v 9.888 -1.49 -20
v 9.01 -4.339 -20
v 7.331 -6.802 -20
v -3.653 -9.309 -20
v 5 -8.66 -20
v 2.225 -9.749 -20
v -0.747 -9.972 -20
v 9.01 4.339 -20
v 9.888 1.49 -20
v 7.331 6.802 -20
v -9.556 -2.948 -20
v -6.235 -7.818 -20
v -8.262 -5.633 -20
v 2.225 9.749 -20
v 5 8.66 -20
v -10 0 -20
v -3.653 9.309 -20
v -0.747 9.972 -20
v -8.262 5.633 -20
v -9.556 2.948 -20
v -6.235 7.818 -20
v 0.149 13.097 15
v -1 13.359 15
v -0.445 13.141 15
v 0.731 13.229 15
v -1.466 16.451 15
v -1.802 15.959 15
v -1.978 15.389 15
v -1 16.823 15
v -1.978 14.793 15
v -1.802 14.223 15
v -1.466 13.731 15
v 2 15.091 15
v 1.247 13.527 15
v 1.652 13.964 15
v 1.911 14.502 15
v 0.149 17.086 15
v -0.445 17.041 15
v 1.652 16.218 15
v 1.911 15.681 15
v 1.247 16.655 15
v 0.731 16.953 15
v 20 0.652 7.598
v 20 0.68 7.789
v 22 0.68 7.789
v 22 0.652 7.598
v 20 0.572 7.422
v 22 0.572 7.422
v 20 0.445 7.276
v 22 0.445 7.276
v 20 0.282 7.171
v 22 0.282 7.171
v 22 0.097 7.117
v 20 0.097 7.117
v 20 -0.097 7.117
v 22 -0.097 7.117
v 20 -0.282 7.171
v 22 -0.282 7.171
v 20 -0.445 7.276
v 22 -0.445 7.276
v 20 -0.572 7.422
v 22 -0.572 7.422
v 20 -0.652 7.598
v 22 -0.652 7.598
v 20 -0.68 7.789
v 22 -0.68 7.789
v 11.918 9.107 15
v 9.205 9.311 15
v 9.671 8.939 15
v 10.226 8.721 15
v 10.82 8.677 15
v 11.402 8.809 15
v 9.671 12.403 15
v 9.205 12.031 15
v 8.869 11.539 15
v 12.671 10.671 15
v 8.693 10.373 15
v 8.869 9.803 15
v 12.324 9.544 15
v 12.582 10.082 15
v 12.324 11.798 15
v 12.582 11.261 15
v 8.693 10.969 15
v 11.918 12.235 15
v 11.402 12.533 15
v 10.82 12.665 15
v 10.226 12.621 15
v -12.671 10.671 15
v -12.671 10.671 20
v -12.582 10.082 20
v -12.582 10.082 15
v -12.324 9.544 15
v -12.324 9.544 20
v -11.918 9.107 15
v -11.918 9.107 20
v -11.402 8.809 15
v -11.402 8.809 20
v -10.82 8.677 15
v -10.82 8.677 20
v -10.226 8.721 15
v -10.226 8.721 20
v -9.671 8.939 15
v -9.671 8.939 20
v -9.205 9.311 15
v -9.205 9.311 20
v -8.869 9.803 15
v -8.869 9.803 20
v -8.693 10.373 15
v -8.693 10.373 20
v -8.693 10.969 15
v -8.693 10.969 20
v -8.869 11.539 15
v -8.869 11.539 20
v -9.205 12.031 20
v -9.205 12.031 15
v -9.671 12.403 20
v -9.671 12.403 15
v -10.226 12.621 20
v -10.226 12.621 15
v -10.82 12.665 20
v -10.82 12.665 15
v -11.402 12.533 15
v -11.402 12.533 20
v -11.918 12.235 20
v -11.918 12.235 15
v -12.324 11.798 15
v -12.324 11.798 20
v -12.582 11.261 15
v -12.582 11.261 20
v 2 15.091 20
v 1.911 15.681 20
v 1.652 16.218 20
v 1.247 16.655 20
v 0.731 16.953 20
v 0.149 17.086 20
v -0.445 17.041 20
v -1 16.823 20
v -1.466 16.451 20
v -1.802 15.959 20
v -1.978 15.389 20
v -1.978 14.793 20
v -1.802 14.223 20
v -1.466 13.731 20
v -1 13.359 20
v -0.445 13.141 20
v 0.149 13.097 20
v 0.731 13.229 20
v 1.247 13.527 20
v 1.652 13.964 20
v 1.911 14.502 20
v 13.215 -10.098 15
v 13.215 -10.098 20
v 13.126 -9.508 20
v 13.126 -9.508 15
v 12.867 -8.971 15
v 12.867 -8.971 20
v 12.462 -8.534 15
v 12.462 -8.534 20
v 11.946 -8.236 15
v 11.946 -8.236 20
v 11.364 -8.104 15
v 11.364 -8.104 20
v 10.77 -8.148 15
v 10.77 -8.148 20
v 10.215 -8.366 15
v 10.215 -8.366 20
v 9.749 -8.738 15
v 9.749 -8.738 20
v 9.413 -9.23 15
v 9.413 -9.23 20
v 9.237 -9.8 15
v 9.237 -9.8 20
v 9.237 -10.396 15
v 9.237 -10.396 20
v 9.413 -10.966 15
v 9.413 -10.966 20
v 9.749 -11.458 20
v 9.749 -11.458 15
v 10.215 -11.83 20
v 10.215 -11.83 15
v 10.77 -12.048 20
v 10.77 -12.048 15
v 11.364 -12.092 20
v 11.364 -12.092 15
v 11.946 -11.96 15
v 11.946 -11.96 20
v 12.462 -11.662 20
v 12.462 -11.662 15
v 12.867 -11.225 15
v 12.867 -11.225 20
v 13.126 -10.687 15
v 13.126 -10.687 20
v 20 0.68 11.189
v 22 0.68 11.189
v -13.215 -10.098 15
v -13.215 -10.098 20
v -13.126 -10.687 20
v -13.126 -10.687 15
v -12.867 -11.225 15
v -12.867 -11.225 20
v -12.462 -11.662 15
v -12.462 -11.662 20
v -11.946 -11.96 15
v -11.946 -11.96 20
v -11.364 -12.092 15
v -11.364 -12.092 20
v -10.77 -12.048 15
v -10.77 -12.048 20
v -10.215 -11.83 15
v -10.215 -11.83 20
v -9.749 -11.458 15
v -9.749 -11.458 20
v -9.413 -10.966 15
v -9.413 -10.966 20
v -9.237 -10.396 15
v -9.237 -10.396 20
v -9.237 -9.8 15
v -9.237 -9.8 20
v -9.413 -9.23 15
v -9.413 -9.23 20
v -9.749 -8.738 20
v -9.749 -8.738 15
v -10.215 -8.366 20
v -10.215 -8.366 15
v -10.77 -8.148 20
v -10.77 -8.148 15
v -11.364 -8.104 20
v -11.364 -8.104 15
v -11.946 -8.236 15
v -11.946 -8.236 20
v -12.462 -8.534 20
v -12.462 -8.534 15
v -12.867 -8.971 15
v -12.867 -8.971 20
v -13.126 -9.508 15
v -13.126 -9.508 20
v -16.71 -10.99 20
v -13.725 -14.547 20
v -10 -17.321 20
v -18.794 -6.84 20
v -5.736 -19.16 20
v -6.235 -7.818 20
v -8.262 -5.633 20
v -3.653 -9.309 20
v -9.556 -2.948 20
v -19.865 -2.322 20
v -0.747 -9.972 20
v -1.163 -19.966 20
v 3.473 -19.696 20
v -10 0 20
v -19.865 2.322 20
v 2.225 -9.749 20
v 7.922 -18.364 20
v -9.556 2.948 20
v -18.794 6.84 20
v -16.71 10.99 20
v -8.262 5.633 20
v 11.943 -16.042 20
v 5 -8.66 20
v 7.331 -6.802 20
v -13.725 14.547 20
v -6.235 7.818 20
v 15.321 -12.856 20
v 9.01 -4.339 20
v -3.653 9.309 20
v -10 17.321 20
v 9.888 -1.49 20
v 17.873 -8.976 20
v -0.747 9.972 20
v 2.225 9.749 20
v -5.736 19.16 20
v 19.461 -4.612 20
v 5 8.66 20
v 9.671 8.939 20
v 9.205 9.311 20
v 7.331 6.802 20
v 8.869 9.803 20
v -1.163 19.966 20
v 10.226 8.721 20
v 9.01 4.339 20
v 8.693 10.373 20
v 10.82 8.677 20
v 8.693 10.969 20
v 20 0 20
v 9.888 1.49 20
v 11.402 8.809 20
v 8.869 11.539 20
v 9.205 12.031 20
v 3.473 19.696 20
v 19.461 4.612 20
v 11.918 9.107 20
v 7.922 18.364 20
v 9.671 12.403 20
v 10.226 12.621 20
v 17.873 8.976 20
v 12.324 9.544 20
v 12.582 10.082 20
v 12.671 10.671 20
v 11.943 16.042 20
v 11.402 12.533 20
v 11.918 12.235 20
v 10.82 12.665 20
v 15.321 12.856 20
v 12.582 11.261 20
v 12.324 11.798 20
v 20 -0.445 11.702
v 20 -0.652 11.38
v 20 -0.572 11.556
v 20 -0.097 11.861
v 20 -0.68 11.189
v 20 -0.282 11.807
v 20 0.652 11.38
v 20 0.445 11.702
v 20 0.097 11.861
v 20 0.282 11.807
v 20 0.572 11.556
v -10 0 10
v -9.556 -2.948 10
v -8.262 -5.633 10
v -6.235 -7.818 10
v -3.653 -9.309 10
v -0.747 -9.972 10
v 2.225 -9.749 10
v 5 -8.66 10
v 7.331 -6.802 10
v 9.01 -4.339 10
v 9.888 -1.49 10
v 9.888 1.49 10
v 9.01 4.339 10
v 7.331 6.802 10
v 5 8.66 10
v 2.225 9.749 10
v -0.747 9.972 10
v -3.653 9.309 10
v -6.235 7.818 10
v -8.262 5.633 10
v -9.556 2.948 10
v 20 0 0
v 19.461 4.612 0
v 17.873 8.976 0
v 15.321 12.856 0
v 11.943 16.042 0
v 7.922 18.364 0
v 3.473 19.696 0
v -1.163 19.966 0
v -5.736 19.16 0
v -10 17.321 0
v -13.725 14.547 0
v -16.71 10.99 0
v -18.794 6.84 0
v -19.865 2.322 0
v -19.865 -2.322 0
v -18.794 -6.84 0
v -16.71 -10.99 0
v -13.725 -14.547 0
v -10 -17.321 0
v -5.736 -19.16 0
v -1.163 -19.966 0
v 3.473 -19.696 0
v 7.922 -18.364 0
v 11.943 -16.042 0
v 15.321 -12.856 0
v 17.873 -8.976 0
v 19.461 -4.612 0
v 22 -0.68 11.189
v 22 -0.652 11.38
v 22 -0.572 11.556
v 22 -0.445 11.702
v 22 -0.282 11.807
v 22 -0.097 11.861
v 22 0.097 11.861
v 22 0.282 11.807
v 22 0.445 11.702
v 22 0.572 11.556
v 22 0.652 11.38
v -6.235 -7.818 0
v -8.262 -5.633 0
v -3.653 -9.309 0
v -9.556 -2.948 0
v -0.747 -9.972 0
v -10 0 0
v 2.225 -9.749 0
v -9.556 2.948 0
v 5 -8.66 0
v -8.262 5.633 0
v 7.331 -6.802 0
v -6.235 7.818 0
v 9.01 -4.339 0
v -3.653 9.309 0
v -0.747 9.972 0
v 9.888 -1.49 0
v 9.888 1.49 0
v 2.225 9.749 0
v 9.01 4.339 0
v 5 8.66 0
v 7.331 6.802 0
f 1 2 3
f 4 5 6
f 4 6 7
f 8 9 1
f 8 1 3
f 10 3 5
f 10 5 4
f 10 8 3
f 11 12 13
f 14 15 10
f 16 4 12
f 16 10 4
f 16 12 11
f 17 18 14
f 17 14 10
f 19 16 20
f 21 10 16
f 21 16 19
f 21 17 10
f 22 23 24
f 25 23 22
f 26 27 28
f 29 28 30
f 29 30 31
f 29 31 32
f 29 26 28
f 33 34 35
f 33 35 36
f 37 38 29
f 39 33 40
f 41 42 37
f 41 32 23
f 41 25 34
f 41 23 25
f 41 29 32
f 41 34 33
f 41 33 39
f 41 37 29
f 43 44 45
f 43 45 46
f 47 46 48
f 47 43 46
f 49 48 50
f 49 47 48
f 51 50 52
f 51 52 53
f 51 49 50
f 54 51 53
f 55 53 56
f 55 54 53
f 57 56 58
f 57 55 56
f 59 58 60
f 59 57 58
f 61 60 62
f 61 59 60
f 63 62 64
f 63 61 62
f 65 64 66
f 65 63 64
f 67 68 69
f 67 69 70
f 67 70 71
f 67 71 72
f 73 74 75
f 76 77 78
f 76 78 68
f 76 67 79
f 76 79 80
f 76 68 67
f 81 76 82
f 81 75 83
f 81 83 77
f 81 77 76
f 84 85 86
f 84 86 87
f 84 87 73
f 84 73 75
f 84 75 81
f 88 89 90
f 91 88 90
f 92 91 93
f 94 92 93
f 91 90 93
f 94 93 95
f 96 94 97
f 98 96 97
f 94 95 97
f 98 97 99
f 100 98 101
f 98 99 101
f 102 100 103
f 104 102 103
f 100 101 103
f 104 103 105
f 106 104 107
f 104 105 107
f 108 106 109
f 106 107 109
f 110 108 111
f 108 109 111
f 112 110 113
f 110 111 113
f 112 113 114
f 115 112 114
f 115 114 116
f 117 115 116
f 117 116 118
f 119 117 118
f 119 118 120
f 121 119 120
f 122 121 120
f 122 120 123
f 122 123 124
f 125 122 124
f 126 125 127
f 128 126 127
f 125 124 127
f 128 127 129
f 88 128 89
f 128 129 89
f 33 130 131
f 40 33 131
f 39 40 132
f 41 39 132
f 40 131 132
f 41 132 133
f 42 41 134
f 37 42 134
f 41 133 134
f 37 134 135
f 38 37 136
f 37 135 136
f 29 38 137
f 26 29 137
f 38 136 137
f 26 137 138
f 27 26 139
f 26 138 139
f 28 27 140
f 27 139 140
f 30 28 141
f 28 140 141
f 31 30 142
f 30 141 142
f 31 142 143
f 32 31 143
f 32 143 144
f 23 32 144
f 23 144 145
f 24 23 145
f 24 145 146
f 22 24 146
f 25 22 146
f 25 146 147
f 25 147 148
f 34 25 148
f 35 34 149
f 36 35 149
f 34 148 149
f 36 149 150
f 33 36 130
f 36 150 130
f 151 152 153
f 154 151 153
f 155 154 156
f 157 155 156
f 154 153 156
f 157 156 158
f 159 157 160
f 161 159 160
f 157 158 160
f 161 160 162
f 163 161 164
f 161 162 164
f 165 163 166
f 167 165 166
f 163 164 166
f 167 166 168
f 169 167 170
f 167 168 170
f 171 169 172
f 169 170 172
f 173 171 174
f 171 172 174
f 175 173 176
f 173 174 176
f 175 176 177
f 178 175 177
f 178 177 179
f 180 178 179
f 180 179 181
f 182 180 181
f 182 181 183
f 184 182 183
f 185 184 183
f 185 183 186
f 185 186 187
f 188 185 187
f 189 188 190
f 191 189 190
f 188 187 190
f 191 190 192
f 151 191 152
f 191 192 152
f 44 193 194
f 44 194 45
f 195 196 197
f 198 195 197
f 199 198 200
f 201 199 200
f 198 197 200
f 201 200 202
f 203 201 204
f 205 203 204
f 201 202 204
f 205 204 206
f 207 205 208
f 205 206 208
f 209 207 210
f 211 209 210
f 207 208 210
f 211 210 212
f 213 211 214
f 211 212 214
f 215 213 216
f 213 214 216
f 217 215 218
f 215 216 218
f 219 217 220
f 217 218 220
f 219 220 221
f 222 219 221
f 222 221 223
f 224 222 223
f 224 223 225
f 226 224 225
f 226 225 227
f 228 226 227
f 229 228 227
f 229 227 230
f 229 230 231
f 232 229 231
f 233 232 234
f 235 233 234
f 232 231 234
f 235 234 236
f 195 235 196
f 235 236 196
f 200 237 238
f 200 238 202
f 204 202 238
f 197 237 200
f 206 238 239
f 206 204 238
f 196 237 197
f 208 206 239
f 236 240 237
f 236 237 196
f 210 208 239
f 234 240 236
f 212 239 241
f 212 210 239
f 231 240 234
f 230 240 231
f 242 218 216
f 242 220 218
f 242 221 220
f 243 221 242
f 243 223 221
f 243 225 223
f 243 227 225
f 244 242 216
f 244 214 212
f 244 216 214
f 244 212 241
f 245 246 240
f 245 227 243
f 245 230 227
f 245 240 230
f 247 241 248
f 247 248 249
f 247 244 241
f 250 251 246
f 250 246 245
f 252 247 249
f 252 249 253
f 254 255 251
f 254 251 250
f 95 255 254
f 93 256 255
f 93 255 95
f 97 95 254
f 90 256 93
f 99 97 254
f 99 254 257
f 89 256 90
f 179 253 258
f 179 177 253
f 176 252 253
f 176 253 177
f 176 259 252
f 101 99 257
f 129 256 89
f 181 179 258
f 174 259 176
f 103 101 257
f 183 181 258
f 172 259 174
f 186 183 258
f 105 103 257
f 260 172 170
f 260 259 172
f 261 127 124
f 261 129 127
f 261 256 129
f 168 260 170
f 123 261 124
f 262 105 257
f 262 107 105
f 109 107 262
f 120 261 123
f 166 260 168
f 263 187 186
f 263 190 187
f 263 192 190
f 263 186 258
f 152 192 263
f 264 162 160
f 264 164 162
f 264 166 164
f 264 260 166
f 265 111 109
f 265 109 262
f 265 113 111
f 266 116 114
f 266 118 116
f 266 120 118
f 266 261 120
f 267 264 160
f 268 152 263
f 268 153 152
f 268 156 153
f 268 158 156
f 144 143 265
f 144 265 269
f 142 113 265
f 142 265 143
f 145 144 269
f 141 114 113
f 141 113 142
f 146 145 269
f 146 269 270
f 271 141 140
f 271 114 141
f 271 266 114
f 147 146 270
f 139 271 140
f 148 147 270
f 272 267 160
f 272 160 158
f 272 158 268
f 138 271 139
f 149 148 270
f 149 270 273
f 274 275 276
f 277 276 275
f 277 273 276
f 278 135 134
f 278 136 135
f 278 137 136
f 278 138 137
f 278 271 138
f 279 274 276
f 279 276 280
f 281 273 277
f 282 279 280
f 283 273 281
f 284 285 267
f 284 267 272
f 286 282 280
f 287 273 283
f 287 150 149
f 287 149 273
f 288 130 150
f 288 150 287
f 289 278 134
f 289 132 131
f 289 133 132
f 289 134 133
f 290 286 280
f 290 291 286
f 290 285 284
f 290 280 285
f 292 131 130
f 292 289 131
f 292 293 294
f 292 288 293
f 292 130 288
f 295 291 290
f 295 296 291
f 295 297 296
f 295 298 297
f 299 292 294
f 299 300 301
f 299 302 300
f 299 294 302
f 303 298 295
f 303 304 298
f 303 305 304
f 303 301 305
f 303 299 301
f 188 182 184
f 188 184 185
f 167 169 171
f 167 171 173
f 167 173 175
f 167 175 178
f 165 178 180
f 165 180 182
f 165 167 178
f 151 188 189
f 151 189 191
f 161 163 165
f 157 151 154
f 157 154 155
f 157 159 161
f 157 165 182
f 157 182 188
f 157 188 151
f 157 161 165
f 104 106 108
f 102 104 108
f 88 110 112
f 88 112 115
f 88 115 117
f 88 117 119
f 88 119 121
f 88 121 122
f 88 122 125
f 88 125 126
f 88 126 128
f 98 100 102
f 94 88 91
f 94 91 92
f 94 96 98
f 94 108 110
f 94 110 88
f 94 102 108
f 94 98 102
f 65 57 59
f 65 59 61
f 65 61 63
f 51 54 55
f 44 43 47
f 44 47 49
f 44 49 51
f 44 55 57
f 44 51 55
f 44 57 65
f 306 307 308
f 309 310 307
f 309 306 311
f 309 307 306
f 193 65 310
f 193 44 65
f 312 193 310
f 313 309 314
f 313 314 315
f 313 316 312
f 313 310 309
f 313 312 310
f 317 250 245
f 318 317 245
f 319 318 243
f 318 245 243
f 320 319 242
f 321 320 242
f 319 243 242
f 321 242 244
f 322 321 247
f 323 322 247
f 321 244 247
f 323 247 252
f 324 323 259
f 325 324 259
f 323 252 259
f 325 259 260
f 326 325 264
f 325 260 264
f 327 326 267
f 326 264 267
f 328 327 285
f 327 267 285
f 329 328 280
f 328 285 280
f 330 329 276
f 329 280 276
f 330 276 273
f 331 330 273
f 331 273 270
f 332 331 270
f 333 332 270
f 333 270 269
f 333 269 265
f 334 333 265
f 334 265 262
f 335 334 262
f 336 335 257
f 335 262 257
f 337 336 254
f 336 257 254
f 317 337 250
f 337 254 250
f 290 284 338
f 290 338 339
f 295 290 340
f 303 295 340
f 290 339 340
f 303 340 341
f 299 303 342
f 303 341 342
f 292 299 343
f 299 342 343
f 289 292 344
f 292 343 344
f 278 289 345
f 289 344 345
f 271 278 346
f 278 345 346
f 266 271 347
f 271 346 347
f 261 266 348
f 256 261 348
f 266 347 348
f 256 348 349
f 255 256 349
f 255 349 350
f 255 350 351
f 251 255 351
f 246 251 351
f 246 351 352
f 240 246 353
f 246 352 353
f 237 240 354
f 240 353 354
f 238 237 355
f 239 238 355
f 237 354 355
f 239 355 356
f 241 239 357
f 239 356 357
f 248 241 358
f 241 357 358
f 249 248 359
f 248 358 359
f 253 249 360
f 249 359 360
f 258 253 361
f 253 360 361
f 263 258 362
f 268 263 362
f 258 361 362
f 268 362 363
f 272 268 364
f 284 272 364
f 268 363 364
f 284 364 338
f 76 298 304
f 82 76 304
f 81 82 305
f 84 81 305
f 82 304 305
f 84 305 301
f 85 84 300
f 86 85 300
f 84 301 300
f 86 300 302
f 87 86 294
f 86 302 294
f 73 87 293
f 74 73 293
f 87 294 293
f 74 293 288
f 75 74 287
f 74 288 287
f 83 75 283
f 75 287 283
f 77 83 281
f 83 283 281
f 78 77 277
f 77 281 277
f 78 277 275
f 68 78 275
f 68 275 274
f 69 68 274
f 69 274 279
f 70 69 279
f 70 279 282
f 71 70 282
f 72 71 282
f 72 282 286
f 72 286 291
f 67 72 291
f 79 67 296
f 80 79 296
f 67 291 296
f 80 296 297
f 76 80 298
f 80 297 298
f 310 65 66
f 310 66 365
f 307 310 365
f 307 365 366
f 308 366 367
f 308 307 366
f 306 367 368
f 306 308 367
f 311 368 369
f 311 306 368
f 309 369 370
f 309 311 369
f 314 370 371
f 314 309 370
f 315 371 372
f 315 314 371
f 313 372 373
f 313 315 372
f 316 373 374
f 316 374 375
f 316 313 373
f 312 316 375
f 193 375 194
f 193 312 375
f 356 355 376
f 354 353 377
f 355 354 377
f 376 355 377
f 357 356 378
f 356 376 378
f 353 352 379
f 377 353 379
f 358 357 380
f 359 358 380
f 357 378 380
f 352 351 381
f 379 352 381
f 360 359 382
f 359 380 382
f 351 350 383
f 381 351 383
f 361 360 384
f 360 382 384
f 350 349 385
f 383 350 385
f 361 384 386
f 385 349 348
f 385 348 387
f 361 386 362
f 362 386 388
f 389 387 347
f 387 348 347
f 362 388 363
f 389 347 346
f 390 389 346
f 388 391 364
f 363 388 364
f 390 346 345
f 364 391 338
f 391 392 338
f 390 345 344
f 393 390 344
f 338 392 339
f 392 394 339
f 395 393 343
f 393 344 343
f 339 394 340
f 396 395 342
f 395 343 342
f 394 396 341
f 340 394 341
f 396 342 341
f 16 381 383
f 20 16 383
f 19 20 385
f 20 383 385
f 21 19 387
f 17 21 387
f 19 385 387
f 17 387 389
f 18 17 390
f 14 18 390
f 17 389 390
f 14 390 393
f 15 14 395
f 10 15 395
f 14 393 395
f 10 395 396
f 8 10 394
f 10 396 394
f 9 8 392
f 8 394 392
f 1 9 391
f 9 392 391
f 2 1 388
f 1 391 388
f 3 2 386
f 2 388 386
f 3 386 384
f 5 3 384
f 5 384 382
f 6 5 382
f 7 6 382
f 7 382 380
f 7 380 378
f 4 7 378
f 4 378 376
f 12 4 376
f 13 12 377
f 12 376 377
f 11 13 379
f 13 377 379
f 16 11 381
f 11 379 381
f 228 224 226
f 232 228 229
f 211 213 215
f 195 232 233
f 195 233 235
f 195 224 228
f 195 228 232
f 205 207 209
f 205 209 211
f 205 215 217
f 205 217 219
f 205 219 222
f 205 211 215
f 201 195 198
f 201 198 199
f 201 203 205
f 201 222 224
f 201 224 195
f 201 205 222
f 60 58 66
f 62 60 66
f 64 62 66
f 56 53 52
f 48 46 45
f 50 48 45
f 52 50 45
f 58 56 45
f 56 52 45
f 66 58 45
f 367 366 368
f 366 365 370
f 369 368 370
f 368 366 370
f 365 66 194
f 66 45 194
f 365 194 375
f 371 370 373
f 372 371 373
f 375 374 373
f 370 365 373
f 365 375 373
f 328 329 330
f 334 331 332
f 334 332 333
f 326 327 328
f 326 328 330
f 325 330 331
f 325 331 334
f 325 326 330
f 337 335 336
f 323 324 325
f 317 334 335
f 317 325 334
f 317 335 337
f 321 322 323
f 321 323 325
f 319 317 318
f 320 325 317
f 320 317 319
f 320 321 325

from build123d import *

# Parameters (mm, degrees)
SKETCH1_R           = 20
BOSS_EXTRUDE1_DEPTH = 20
SKETCH2_R           = 10
BOSS_EXTRUDE2_DEPTH = 20
SKETCH3_R           = 10
CUT_EXTRUDE1_DEPTH  = 10
SKETCH9_R           = 2
CUT_EXTRUDE2_DEPTH  = 5
BOSS_EXTRUDE3_DEPTH = 2


with BuildPart() as part:
    # Sketch1 → Boss-Extrude1 (new body)
    with BuildSketch(Plane.XY):
        Circle(SKETCH1_R)
    extrude(amount=BOSS_EXTRUDE1_DEPTH)

    # Sketch2 → Boss-Extrude2 (add)
    with BuildSketch(Plane(origin=(0, 0, 0), x_dir=(-1, 0, 0), z_dir=(0, 0, -1))):
        Circle(SKETCH2_R)
    extrude(amount=BOSS_EXTRUDE2_DEPTH)

    # Sketch3 → Cut-Extrude1 (cut)
    with BuildSketch(Plane.XY.offset(20)):
        with Locations(Location((0, 0, 0), (0, 0, 180))):
            Circle(SKETCH3_R)
    extrude(amount=-CUT_EXTRUDE1_DEPTH, mode=Mode.SUBTRACT)

    # Sketch9 → Cut-Extrude2 (cut)
    with BuildSketch(Plane.XY.offset(20)):
        with Locations((0, 15.091110353)):
            Circle(SKETCH9_R)
        with Locations((10.671026466, 10.671026466)):
            Circle(SKETCH9_R)
        with Locations((11.214880569, -10.097923821)):
            Circle(SKETCH9_R)
        with Locations(Location((-11.214880569, -10.097923821, 0), (0, 0, 180))):
            Circle(SKETCH9_R)
        with Locations(Location((-10.671026466, 10.671026466, 0), (0, 0, 180))):
            Circle(SKETCH9_R)
    extrude(amount=-CUT_EXTRUDE2_DEPTH, mode=Mode.SUBTRACT)


with BuildPart() as body_2:
    # Sketch10 → Boss-Extrude3 (new body)
    with BuildSketch(Plane(origin=(20, 0, 0), x_dir=(0, 0, -1), z_dir=(1, 0, 0))):
        with BuildLine():
            Line((-11.188513729, 0.679808429), (-7.789471584, 0.679808429))
            ThreePointArc((-7.789471584, 0.679808429), (-7.109663155, 0), (-7.789471584, -0.679808429))
            Line((-7.789471584, -0.679808429), (-11.188513729, -0.679808429))
            ThreePointArc((-11.188513729, -0.679808429), (-11.868322158, 0), (-11.188513729, 0.679808429))
        make_face()
    extrude(amount=BOSS_EXTRUDE3_DEPTH)


solid = Compound([part.part, body_2.part])
